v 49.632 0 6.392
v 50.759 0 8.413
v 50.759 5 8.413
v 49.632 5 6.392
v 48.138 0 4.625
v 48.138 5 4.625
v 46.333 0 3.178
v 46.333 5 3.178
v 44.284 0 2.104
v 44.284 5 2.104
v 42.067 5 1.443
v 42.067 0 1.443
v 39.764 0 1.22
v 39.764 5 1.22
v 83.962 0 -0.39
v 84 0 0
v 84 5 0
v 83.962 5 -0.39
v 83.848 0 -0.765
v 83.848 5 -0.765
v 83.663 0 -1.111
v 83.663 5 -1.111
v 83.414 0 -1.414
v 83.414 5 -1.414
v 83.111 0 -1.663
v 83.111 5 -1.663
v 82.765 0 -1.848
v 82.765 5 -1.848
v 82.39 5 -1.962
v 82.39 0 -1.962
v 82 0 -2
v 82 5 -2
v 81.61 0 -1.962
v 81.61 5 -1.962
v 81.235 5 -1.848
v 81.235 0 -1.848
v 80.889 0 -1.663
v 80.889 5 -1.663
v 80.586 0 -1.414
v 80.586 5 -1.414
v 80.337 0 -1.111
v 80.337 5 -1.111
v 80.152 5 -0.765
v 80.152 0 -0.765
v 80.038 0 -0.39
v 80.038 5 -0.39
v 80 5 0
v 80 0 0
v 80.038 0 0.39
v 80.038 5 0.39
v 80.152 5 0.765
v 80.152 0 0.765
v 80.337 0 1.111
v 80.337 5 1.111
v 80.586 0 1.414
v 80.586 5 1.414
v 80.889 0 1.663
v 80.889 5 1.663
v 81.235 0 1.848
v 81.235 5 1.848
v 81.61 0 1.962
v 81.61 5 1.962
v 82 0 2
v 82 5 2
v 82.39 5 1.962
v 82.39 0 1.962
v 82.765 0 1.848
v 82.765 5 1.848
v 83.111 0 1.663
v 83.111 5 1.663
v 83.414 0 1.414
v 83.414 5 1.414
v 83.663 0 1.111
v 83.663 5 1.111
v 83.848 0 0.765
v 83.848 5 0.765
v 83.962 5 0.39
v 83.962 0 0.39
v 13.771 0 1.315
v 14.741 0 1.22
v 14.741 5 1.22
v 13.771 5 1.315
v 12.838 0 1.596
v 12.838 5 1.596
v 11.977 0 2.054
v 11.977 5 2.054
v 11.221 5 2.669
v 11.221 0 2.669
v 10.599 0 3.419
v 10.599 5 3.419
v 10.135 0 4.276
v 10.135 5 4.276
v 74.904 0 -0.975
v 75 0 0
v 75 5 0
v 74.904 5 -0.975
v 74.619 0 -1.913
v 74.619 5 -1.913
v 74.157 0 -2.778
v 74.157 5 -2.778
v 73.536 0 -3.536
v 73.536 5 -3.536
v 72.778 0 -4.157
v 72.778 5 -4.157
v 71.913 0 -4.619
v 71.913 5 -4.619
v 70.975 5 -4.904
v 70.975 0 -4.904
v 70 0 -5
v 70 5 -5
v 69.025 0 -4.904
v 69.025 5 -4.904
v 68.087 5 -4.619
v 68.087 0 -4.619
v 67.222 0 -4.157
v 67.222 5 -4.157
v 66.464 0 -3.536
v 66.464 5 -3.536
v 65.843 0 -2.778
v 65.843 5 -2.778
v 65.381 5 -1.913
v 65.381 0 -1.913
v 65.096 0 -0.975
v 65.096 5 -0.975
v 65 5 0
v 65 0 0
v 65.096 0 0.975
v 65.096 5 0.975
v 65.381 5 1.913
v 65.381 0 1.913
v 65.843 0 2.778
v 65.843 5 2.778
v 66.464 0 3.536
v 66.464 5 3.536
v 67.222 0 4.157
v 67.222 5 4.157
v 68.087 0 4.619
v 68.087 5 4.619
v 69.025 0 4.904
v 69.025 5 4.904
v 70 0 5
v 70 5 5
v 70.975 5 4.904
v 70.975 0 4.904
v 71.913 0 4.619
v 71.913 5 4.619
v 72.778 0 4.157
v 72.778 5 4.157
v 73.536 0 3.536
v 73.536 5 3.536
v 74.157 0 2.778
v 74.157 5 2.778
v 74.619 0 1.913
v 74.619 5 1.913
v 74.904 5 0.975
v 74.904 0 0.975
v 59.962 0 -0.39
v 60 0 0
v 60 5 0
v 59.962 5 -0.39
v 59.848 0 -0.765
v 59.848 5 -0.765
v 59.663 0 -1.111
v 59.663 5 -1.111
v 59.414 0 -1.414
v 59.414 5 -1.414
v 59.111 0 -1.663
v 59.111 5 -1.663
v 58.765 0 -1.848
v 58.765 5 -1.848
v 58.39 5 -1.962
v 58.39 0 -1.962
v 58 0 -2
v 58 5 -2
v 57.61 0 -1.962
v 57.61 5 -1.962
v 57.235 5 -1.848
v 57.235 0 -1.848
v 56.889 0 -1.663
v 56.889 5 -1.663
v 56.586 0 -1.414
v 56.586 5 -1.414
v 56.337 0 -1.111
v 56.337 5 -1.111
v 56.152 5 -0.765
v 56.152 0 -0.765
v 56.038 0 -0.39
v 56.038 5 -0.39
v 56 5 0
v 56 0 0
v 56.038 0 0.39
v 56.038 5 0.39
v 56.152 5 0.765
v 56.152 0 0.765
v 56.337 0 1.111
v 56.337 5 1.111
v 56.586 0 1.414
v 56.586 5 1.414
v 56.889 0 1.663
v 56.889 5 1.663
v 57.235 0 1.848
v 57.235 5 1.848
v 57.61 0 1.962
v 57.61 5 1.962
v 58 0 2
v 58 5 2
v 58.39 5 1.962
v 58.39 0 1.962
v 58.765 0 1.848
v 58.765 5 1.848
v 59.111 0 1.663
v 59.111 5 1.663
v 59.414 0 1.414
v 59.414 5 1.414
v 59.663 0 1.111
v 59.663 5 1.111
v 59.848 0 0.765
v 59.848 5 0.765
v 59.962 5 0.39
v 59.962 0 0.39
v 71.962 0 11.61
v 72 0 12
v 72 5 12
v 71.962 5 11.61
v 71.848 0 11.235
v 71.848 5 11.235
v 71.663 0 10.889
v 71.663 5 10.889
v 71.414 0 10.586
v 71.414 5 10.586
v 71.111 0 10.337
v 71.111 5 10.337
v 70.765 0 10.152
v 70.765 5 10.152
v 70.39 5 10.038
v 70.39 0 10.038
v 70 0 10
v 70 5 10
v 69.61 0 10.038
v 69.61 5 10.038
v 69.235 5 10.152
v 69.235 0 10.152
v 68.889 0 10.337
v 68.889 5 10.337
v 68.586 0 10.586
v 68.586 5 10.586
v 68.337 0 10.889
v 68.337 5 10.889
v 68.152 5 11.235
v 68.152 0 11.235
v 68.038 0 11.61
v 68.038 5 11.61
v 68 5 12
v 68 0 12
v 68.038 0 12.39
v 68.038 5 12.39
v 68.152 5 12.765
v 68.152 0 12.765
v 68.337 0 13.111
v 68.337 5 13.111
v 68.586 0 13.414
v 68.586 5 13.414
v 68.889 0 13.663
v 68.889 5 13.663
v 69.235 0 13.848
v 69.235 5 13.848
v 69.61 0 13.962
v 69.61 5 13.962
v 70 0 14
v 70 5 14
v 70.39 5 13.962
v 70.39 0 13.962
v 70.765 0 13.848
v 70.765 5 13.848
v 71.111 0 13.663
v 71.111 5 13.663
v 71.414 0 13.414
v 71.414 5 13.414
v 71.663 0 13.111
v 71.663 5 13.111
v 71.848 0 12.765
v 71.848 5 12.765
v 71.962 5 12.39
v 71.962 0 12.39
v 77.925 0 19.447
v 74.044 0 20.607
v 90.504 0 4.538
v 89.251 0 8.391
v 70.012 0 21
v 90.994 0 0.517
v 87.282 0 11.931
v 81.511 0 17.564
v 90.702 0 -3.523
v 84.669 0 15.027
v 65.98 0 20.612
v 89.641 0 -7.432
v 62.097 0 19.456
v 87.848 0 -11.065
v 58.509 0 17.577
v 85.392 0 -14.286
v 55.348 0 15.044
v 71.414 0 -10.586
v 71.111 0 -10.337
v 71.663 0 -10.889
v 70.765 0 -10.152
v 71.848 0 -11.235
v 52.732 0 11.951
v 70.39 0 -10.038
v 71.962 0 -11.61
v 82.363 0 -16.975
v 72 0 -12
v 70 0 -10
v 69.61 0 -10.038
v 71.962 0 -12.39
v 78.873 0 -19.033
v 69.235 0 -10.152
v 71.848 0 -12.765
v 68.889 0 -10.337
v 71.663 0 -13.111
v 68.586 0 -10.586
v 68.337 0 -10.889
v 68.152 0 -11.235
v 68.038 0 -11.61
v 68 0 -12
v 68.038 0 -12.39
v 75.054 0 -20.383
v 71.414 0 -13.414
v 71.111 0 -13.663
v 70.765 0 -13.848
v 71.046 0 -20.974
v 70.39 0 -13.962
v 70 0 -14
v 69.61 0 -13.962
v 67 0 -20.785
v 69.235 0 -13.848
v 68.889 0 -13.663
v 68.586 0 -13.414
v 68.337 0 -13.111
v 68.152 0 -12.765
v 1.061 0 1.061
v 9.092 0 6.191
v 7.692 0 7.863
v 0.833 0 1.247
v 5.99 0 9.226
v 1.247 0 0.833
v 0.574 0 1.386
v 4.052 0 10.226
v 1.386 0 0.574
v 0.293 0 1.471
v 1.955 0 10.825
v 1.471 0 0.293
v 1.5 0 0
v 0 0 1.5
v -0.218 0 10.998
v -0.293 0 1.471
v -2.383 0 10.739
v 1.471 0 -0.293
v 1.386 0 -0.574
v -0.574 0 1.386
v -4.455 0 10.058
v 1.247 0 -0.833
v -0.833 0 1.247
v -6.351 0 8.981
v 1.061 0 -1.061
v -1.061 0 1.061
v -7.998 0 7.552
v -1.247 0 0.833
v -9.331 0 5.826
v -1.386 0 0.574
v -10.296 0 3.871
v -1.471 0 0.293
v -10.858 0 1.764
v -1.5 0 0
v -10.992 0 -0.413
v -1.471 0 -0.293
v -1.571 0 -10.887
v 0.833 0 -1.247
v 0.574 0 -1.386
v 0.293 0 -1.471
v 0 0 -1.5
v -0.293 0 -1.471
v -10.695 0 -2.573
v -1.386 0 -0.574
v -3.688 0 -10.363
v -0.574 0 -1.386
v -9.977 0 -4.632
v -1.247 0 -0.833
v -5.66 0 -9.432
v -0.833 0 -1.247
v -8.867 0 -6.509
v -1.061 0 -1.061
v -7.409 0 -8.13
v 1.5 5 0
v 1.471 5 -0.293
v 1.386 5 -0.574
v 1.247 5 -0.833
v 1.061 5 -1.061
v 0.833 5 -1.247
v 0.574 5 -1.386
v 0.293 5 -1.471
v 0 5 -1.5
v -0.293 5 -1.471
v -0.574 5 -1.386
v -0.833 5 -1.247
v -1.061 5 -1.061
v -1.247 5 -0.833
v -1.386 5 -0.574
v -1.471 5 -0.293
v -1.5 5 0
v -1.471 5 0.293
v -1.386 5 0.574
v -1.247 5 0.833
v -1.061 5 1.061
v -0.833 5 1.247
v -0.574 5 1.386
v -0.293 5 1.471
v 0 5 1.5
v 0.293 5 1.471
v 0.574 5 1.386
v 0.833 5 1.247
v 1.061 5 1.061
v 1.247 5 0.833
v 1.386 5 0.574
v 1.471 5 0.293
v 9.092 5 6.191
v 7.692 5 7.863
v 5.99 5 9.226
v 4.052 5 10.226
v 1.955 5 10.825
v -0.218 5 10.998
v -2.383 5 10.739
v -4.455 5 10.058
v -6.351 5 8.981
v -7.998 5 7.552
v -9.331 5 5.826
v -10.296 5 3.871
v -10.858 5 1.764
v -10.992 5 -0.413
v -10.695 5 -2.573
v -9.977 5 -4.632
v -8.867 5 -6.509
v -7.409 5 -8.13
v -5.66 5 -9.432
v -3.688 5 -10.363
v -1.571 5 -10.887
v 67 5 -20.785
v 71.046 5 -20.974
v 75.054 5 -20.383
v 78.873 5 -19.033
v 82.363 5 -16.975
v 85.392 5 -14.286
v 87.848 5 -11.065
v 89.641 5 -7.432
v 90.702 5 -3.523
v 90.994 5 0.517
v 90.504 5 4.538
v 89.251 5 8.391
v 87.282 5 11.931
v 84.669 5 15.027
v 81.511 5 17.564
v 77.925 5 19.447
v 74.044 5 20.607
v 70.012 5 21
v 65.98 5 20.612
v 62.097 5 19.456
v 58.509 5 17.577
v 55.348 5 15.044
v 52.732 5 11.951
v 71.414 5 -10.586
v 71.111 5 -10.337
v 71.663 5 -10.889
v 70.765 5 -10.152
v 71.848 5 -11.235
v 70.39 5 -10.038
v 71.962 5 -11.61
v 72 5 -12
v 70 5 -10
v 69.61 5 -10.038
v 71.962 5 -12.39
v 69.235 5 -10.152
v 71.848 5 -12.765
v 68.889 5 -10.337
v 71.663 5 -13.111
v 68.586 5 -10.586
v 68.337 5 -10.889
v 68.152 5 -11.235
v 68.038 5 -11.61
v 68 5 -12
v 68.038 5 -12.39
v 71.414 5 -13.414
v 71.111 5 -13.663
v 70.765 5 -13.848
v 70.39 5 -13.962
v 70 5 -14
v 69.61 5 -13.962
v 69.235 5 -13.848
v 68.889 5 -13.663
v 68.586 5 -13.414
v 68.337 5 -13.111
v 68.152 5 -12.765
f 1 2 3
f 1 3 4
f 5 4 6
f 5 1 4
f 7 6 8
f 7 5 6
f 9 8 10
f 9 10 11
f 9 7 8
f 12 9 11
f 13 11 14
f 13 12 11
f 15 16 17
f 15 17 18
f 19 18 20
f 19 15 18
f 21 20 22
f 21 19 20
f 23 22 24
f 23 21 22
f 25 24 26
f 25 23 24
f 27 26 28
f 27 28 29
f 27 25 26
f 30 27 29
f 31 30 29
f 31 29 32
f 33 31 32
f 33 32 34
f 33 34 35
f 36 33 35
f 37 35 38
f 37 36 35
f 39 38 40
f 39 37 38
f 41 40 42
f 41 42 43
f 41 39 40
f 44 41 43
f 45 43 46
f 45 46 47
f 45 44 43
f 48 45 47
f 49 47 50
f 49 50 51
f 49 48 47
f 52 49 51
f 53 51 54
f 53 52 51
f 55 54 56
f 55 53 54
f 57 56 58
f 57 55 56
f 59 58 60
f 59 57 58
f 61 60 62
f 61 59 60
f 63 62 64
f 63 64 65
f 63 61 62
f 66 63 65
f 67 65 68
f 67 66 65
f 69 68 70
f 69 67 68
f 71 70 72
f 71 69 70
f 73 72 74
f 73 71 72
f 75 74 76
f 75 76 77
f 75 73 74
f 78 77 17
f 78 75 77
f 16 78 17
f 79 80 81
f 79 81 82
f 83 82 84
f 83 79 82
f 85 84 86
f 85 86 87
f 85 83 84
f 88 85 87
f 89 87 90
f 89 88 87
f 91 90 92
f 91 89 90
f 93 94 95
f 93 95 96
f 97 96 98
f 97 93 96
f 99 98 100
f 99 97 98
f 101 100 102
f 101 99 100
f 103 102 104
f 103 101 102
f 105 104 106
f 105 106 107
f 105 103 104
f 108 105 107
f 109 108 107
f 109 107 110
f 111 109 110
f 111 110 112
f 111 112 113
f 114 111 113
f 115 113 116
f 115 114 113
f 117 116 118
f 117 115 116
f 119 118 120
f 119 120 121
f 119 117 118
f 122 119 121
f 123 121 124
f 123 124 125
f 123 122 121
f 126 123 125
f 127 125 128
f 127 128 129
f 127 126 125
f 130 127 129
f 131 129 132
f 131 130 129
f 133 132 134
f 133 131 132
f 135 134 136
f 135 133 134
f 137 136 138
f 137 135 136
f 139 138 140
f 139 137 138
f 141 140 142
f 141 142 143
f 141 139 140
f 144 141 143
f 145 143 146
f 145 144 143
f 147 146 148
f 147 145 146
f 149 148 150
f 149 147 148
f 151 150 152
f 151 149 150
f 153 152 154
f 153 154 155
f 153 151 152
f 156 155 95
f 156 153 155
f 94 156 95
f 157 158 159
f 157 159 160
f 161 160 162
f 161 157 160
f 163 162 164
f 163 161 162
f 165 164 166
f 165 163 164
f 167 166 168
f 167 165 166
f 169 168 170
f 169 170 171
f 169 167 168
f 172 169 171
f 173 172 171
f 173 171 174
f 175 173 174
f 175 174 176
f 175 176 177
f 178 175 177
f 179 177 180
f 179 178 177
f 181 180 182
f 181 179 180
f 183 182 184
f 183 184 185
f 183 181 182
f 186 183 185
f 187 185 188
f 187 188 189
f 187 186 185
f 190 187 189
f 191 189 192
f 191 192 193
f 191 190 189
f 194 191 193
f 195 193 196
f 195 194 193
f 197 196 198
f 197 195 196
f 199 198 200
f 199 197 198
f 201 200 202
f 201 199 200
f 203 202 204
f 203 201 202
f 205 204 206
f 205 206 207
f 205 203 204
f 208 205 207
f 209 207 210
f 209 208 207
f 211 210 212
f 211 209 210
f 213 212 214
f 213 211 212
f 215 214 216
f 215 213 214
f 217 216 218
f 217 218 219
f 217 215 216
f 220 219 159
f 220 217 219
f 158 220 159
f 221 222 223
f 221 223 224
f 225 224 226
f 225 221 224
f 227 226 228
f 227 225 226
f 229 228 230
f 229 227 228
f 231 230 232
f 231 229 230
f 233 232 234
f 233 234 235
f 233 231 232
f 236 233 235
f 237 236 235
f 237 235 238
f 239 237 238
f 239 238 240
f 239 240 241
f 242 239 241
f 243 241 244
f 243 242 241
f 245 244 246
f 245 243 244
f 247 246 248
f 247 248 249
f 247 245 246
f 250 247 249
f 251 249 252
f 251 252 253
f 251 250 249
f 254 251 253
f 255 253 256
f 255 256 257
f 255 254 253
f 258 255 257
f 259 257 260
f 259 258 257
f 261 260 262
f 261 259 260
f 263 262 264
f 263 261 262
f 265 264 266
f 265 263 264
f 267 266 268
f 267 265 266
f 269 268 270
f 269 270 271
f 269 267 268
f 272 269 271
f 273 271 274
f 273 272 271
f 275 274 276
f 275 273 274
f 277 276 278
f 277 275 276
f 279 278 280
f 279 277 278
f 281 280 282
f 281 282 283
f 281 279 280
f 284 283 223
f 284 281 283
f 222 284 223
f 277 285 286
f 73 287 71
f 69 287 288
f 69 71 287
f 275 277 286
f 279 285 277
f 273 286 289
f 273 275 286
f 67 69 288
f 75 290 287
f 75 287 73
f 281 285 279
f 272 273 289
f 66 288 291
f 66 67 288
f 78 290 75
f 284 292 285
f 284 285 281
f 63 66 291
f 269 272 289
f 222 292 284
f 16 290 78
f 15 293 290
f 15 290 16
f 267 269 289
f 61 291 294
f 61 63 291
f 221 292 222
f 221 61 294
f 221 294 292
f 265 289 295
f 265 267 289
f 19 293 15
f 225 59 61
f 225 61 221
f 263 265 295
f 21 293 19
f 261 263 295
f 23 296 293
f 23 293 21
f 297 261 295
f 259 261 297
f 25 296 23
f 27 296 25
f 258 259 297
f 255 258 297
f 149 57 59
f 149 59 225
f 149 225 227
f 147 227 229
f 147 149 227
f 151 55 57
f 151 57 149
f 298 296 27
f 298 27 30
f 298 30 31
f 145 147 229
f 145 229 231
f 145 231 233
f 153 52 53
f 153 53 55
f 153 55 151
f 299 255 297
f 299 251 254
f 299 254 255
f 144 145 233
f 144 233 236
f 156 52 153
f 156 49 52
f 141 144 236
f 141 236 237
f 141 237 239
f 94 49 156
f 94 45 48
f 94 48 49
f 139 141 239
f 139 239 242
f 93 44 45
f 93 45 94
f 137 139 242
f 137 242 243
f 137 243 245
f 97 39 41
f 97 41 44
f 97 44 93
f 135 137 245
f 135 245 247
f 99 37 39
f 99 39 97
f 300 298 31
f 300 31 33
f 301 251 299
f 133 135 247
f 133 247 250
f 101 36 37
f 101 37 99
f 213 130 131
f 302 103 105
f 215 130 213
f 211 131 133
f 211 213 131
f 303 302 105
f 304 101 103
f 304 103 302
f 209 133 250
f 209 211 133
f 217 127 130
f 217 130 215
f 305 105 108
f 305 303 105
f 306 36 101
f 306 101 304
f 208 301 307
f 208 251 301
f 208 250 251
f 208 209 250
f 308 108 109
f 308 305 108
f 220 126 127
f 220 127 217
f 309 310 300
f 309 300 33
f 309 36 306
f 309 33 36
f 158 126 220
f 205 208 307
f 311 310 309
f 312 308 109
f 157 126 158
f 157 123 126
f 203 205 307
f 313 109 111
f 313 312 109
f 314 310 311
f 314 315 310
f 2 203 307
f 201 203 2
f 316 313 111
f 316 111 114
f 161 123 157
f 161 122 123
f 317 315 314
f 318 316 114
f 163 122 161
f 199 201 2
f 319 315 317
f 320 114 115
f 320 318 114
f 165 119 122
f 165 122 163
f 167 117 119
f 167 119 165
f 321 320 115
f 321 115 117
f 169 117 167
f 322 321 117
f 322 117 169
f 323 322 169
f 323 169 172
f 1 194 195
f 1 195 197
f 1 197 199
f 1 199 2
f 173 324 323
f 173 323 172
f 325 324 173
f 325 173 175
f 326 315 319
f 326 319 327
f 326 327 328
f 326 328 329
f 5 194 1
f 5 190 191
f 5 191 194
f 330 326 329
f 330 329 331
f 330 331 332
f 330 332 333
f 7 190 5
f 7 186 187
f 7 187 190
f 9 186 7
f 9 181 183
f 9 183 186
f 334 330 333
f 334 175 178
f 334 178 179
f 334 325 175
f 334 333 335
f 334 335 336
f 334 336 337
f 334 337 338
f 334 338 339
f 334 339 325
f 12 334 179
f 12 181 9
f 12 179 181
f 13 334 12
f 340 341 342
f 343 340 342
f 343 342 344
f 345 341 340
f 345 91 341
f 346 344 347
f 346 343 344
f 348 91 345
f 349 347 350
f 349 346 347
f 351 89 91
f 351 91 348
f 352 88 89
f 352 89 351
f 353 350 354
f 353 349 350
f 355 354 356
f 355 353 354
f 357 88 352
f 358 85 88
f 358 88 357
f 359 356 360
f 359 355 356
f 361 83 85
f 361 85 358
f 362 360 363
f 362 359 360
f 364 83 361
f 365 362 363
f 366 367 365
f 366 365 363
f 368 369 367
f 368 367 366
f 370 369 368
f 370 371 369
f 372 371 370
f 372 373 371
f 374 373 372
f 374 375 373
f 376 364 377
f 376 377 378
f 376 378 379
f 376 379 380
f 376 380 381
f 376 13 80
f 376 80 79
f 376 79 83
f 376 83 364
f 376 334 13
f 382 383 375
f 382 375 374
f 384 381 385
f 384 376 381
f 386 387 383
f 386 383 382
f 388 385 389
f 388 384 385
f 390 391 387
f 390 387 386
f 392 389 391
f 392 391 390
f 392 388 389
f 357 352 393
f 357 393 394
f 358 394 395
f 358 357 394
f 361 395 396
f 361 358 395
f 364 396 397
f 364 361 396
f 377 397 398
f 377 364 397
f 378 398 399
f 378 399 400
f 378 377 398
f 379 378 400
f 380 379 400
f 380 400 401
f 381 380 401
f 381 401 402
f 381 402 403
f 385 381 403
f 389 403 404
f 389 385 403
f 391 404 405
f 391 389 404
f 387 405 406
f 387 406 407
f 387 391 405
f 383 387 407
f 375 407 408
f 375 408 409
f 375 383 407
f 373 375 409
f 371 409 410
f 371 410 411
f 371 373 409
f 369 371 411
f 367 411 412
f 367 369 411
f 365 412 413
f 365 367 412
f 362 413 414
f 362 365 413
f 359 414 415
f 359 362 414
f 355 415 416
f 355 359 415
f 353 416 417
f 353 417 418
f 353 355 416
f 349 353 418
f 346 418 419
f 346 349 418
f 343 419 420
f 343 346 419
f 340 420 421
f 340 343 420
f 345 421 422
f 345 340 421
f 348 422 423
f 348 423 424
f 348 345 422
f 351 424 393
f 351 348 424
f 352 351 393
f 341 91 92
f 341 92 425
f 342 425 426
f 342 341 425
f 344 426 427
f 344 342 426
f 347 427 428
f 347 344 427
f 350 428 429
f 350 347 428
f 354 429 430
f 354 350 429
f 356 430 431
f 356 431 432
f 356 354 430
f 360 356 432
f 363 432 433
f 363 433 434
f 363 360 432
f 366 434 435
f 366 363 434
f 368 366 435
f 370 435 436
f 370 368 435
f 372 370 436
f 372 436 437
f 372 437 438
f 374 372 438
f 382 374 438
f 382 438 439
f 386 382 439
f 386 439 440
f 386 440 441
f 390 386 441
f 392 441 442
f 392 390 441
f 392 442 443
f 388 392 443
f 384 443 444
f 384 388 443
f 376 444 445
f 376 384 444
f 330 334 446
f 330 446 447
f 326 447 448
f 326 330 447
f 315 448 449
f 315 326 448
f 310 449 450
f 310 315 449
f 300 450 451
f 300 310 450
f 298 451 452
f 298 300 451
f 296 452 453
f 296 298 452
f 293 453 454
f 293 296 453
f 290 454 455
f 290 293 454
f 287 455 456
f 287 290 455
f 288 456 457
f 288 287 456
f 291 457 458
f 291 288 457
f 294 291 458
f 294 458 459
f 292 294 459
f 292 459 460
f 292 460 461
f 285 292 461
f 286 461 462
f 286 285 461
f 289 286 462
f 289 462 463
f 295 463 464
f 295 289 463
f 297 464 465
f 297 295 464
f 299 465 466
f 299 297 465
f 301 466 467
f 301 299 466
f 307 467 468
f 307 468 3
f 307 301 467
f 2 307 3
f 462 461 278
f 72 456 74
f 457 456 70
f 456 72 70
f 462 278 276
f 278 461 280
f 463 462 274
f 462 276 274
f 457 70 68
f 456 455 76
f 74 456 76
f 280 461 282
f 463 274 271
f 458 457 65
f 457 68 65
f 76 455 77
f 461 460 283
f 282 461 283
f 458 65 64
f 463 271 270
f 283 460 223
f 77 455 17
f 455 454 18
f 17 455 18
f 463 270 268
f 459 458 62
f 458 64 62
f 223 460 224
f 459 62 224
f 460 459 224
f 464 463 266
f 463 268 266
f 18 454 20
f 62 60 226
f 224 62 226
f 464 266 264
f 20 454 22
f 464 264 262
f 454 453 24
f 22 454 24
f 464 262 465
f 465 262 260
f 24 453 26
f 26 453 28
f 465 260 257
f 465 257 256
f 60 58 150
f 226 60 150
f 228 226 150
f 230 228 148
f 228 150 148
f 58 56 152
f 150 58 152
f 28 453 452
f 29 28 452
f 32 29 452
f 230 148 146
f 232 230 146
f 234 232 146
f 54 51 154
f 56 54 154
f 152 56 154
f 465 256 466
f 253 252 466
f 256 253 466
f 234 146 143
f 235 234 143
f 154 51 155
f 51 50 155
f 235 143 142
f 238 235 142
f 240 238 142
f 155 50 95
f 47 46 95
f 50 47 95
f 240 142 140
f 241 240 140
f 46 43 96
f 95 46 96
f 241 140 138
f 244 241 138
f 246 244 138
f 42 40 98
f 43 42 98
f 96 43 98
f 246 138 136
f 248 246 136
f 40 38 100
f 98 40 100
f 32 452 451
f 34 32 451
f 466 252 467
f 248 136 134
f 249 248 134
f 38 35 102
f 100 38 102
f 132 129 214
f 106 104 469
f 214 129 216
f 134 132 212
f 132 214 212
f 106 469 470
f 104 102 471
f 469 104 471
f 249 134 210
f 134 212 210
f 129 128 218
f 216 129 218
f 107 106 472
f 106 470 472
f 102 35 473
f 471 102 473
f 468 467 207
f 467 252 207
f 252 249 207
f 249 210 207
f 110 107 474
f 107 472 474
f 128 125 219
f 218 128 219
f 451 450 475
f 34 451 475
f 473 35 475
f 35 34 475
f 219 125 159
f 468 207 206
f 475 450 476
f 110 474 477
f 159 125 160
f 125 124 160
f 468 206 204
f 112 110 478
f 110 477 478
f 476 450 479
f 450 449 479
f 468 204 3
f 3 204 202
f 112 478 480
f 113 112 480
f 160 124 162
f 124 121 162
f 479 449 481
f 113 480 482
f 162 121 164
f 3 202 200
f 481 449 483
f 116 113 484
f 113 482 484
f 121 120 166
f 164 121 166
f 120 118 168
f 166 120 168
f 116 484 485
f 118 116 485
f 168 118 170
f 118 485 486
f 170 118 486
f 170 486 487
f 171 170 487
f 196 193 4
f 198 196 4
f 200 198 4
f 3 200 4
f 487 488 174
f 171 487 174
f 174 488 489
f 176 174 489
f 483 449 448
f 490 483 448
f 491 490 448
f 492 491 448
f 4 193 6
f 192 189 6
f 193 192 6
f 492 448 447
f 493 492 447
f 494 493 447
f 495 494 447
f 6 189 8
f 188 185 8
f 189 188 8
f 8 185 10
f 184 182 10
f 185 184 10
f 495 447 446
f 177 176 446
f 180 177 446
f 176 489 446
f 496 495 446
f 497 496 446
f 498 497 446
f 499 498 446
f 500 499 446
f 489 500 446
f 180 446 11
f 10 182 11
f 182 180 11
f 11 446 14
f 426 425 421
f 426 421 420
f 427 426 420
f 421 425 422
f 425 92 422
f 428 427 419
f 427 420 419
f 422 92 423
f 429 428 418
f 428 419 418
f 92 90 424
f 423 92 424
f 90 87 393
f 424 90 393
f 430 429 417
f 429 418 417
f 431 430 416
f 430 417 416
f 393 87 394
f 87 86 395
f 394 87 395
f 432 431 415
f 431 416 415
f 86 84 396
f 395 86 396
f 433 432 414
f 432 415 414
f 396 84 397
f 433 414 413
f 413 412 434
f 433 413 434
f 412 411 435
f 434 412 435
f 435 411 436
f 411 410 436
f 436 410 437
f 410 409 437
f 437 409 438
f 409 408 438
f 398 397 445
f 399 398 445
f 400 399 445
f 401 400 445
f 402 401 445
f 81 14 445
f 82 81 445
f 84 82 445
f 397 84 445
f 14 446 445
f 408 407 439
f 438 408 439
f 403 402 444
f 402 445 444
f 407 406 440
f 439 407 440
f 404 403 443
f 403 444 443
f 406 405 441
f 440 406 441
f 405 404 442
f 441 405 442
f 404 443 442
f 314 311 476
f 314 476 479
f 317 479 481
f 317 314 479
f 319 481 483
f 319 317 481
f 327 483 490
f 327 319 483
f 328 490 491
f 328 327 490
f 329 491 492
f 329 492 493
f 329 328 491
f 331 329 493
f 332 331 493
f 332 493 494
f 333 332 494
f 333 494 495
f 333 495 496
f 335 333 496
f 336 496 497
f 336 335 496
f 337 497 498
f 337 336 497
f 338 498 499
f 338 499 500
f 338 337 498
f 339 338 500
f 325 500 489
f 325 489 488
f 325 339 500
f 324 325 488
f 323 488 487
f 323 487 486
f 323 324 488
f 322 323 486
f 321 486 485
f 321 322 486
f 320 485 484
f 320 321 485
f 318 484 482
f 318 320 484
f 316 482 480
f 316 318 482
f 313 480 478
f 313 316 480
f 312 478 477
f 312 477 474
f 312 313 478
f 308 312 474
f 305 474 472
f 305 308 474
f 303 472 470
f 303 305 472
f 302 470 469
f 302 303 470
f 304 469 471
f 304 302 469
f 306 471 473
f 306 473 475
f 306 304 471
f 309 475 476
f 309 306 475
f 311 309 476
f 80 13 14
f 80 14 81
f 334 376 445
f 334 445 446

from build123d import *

# Parameters (mm, degrees)
SKETCH1_R           = 1.5
SKETCH1_R_2         = 5
SKETCH1_R_3         = 2
BOSS_EXTRUDE1_DEPTH = 5


with BuildPart() as part:
    # Sketch1 → Boss-Extrude1 (new body)
    with BuildSketch(Plane(origin=(0, 0, 0), x_dir=(1, 0, 0), z_dir=(0, 1, 0))):
        with BuildLine():
            Line((-1.571428571, 10.887176505), (67, 20.784609691))
            ThreePointArc((67, 20.784609691), (88.351830916, -10.208344725), (50.75875, -8.412746189))
            ThreePointArc((50.75875, -8.412746189), (46.333095385, -3.17793327), (39.76375, -1.220029725))
            Line((39.76375, -1.220029725), (14.741479919, -1.220029725))
            ThreePointArc((14.741479919, -1.220029725), (11.977316072, -2.05356861), (10.134767445, -4.276270436))
            ThreePointArc((10.134767445, -4.276270436), (-8.707193804, -6.721962218), (-1.571428571, 10.887176505))
        make_face()
        Circle(SKETCH1_R, mode=Mode.SUBTRACT)
        with Locations((70, 0)):
            Circle(SKETCH1_R_2, mode=Mode.SUBTRACT)
        with Locations((70, 12)):
            Circle(SKETCH1_R_3, mode=Mode.SUBTRACT)
        with Locations((82, 0)):
            Circle(SKETCH1_R_3, mode=Mode.SUBTRACT)
        with Locations((70, -12)):
            Circle(SKETCH1_R_3, mode=Mode.SUBTRACT)
        with Locations((58, 0)):
            Circle(SKETCH1_R_3, mode=Mode.SUBTRACT)
    extrude(amount=BOSS_EXTRUDE1_DEPTH)


solid = part.part
